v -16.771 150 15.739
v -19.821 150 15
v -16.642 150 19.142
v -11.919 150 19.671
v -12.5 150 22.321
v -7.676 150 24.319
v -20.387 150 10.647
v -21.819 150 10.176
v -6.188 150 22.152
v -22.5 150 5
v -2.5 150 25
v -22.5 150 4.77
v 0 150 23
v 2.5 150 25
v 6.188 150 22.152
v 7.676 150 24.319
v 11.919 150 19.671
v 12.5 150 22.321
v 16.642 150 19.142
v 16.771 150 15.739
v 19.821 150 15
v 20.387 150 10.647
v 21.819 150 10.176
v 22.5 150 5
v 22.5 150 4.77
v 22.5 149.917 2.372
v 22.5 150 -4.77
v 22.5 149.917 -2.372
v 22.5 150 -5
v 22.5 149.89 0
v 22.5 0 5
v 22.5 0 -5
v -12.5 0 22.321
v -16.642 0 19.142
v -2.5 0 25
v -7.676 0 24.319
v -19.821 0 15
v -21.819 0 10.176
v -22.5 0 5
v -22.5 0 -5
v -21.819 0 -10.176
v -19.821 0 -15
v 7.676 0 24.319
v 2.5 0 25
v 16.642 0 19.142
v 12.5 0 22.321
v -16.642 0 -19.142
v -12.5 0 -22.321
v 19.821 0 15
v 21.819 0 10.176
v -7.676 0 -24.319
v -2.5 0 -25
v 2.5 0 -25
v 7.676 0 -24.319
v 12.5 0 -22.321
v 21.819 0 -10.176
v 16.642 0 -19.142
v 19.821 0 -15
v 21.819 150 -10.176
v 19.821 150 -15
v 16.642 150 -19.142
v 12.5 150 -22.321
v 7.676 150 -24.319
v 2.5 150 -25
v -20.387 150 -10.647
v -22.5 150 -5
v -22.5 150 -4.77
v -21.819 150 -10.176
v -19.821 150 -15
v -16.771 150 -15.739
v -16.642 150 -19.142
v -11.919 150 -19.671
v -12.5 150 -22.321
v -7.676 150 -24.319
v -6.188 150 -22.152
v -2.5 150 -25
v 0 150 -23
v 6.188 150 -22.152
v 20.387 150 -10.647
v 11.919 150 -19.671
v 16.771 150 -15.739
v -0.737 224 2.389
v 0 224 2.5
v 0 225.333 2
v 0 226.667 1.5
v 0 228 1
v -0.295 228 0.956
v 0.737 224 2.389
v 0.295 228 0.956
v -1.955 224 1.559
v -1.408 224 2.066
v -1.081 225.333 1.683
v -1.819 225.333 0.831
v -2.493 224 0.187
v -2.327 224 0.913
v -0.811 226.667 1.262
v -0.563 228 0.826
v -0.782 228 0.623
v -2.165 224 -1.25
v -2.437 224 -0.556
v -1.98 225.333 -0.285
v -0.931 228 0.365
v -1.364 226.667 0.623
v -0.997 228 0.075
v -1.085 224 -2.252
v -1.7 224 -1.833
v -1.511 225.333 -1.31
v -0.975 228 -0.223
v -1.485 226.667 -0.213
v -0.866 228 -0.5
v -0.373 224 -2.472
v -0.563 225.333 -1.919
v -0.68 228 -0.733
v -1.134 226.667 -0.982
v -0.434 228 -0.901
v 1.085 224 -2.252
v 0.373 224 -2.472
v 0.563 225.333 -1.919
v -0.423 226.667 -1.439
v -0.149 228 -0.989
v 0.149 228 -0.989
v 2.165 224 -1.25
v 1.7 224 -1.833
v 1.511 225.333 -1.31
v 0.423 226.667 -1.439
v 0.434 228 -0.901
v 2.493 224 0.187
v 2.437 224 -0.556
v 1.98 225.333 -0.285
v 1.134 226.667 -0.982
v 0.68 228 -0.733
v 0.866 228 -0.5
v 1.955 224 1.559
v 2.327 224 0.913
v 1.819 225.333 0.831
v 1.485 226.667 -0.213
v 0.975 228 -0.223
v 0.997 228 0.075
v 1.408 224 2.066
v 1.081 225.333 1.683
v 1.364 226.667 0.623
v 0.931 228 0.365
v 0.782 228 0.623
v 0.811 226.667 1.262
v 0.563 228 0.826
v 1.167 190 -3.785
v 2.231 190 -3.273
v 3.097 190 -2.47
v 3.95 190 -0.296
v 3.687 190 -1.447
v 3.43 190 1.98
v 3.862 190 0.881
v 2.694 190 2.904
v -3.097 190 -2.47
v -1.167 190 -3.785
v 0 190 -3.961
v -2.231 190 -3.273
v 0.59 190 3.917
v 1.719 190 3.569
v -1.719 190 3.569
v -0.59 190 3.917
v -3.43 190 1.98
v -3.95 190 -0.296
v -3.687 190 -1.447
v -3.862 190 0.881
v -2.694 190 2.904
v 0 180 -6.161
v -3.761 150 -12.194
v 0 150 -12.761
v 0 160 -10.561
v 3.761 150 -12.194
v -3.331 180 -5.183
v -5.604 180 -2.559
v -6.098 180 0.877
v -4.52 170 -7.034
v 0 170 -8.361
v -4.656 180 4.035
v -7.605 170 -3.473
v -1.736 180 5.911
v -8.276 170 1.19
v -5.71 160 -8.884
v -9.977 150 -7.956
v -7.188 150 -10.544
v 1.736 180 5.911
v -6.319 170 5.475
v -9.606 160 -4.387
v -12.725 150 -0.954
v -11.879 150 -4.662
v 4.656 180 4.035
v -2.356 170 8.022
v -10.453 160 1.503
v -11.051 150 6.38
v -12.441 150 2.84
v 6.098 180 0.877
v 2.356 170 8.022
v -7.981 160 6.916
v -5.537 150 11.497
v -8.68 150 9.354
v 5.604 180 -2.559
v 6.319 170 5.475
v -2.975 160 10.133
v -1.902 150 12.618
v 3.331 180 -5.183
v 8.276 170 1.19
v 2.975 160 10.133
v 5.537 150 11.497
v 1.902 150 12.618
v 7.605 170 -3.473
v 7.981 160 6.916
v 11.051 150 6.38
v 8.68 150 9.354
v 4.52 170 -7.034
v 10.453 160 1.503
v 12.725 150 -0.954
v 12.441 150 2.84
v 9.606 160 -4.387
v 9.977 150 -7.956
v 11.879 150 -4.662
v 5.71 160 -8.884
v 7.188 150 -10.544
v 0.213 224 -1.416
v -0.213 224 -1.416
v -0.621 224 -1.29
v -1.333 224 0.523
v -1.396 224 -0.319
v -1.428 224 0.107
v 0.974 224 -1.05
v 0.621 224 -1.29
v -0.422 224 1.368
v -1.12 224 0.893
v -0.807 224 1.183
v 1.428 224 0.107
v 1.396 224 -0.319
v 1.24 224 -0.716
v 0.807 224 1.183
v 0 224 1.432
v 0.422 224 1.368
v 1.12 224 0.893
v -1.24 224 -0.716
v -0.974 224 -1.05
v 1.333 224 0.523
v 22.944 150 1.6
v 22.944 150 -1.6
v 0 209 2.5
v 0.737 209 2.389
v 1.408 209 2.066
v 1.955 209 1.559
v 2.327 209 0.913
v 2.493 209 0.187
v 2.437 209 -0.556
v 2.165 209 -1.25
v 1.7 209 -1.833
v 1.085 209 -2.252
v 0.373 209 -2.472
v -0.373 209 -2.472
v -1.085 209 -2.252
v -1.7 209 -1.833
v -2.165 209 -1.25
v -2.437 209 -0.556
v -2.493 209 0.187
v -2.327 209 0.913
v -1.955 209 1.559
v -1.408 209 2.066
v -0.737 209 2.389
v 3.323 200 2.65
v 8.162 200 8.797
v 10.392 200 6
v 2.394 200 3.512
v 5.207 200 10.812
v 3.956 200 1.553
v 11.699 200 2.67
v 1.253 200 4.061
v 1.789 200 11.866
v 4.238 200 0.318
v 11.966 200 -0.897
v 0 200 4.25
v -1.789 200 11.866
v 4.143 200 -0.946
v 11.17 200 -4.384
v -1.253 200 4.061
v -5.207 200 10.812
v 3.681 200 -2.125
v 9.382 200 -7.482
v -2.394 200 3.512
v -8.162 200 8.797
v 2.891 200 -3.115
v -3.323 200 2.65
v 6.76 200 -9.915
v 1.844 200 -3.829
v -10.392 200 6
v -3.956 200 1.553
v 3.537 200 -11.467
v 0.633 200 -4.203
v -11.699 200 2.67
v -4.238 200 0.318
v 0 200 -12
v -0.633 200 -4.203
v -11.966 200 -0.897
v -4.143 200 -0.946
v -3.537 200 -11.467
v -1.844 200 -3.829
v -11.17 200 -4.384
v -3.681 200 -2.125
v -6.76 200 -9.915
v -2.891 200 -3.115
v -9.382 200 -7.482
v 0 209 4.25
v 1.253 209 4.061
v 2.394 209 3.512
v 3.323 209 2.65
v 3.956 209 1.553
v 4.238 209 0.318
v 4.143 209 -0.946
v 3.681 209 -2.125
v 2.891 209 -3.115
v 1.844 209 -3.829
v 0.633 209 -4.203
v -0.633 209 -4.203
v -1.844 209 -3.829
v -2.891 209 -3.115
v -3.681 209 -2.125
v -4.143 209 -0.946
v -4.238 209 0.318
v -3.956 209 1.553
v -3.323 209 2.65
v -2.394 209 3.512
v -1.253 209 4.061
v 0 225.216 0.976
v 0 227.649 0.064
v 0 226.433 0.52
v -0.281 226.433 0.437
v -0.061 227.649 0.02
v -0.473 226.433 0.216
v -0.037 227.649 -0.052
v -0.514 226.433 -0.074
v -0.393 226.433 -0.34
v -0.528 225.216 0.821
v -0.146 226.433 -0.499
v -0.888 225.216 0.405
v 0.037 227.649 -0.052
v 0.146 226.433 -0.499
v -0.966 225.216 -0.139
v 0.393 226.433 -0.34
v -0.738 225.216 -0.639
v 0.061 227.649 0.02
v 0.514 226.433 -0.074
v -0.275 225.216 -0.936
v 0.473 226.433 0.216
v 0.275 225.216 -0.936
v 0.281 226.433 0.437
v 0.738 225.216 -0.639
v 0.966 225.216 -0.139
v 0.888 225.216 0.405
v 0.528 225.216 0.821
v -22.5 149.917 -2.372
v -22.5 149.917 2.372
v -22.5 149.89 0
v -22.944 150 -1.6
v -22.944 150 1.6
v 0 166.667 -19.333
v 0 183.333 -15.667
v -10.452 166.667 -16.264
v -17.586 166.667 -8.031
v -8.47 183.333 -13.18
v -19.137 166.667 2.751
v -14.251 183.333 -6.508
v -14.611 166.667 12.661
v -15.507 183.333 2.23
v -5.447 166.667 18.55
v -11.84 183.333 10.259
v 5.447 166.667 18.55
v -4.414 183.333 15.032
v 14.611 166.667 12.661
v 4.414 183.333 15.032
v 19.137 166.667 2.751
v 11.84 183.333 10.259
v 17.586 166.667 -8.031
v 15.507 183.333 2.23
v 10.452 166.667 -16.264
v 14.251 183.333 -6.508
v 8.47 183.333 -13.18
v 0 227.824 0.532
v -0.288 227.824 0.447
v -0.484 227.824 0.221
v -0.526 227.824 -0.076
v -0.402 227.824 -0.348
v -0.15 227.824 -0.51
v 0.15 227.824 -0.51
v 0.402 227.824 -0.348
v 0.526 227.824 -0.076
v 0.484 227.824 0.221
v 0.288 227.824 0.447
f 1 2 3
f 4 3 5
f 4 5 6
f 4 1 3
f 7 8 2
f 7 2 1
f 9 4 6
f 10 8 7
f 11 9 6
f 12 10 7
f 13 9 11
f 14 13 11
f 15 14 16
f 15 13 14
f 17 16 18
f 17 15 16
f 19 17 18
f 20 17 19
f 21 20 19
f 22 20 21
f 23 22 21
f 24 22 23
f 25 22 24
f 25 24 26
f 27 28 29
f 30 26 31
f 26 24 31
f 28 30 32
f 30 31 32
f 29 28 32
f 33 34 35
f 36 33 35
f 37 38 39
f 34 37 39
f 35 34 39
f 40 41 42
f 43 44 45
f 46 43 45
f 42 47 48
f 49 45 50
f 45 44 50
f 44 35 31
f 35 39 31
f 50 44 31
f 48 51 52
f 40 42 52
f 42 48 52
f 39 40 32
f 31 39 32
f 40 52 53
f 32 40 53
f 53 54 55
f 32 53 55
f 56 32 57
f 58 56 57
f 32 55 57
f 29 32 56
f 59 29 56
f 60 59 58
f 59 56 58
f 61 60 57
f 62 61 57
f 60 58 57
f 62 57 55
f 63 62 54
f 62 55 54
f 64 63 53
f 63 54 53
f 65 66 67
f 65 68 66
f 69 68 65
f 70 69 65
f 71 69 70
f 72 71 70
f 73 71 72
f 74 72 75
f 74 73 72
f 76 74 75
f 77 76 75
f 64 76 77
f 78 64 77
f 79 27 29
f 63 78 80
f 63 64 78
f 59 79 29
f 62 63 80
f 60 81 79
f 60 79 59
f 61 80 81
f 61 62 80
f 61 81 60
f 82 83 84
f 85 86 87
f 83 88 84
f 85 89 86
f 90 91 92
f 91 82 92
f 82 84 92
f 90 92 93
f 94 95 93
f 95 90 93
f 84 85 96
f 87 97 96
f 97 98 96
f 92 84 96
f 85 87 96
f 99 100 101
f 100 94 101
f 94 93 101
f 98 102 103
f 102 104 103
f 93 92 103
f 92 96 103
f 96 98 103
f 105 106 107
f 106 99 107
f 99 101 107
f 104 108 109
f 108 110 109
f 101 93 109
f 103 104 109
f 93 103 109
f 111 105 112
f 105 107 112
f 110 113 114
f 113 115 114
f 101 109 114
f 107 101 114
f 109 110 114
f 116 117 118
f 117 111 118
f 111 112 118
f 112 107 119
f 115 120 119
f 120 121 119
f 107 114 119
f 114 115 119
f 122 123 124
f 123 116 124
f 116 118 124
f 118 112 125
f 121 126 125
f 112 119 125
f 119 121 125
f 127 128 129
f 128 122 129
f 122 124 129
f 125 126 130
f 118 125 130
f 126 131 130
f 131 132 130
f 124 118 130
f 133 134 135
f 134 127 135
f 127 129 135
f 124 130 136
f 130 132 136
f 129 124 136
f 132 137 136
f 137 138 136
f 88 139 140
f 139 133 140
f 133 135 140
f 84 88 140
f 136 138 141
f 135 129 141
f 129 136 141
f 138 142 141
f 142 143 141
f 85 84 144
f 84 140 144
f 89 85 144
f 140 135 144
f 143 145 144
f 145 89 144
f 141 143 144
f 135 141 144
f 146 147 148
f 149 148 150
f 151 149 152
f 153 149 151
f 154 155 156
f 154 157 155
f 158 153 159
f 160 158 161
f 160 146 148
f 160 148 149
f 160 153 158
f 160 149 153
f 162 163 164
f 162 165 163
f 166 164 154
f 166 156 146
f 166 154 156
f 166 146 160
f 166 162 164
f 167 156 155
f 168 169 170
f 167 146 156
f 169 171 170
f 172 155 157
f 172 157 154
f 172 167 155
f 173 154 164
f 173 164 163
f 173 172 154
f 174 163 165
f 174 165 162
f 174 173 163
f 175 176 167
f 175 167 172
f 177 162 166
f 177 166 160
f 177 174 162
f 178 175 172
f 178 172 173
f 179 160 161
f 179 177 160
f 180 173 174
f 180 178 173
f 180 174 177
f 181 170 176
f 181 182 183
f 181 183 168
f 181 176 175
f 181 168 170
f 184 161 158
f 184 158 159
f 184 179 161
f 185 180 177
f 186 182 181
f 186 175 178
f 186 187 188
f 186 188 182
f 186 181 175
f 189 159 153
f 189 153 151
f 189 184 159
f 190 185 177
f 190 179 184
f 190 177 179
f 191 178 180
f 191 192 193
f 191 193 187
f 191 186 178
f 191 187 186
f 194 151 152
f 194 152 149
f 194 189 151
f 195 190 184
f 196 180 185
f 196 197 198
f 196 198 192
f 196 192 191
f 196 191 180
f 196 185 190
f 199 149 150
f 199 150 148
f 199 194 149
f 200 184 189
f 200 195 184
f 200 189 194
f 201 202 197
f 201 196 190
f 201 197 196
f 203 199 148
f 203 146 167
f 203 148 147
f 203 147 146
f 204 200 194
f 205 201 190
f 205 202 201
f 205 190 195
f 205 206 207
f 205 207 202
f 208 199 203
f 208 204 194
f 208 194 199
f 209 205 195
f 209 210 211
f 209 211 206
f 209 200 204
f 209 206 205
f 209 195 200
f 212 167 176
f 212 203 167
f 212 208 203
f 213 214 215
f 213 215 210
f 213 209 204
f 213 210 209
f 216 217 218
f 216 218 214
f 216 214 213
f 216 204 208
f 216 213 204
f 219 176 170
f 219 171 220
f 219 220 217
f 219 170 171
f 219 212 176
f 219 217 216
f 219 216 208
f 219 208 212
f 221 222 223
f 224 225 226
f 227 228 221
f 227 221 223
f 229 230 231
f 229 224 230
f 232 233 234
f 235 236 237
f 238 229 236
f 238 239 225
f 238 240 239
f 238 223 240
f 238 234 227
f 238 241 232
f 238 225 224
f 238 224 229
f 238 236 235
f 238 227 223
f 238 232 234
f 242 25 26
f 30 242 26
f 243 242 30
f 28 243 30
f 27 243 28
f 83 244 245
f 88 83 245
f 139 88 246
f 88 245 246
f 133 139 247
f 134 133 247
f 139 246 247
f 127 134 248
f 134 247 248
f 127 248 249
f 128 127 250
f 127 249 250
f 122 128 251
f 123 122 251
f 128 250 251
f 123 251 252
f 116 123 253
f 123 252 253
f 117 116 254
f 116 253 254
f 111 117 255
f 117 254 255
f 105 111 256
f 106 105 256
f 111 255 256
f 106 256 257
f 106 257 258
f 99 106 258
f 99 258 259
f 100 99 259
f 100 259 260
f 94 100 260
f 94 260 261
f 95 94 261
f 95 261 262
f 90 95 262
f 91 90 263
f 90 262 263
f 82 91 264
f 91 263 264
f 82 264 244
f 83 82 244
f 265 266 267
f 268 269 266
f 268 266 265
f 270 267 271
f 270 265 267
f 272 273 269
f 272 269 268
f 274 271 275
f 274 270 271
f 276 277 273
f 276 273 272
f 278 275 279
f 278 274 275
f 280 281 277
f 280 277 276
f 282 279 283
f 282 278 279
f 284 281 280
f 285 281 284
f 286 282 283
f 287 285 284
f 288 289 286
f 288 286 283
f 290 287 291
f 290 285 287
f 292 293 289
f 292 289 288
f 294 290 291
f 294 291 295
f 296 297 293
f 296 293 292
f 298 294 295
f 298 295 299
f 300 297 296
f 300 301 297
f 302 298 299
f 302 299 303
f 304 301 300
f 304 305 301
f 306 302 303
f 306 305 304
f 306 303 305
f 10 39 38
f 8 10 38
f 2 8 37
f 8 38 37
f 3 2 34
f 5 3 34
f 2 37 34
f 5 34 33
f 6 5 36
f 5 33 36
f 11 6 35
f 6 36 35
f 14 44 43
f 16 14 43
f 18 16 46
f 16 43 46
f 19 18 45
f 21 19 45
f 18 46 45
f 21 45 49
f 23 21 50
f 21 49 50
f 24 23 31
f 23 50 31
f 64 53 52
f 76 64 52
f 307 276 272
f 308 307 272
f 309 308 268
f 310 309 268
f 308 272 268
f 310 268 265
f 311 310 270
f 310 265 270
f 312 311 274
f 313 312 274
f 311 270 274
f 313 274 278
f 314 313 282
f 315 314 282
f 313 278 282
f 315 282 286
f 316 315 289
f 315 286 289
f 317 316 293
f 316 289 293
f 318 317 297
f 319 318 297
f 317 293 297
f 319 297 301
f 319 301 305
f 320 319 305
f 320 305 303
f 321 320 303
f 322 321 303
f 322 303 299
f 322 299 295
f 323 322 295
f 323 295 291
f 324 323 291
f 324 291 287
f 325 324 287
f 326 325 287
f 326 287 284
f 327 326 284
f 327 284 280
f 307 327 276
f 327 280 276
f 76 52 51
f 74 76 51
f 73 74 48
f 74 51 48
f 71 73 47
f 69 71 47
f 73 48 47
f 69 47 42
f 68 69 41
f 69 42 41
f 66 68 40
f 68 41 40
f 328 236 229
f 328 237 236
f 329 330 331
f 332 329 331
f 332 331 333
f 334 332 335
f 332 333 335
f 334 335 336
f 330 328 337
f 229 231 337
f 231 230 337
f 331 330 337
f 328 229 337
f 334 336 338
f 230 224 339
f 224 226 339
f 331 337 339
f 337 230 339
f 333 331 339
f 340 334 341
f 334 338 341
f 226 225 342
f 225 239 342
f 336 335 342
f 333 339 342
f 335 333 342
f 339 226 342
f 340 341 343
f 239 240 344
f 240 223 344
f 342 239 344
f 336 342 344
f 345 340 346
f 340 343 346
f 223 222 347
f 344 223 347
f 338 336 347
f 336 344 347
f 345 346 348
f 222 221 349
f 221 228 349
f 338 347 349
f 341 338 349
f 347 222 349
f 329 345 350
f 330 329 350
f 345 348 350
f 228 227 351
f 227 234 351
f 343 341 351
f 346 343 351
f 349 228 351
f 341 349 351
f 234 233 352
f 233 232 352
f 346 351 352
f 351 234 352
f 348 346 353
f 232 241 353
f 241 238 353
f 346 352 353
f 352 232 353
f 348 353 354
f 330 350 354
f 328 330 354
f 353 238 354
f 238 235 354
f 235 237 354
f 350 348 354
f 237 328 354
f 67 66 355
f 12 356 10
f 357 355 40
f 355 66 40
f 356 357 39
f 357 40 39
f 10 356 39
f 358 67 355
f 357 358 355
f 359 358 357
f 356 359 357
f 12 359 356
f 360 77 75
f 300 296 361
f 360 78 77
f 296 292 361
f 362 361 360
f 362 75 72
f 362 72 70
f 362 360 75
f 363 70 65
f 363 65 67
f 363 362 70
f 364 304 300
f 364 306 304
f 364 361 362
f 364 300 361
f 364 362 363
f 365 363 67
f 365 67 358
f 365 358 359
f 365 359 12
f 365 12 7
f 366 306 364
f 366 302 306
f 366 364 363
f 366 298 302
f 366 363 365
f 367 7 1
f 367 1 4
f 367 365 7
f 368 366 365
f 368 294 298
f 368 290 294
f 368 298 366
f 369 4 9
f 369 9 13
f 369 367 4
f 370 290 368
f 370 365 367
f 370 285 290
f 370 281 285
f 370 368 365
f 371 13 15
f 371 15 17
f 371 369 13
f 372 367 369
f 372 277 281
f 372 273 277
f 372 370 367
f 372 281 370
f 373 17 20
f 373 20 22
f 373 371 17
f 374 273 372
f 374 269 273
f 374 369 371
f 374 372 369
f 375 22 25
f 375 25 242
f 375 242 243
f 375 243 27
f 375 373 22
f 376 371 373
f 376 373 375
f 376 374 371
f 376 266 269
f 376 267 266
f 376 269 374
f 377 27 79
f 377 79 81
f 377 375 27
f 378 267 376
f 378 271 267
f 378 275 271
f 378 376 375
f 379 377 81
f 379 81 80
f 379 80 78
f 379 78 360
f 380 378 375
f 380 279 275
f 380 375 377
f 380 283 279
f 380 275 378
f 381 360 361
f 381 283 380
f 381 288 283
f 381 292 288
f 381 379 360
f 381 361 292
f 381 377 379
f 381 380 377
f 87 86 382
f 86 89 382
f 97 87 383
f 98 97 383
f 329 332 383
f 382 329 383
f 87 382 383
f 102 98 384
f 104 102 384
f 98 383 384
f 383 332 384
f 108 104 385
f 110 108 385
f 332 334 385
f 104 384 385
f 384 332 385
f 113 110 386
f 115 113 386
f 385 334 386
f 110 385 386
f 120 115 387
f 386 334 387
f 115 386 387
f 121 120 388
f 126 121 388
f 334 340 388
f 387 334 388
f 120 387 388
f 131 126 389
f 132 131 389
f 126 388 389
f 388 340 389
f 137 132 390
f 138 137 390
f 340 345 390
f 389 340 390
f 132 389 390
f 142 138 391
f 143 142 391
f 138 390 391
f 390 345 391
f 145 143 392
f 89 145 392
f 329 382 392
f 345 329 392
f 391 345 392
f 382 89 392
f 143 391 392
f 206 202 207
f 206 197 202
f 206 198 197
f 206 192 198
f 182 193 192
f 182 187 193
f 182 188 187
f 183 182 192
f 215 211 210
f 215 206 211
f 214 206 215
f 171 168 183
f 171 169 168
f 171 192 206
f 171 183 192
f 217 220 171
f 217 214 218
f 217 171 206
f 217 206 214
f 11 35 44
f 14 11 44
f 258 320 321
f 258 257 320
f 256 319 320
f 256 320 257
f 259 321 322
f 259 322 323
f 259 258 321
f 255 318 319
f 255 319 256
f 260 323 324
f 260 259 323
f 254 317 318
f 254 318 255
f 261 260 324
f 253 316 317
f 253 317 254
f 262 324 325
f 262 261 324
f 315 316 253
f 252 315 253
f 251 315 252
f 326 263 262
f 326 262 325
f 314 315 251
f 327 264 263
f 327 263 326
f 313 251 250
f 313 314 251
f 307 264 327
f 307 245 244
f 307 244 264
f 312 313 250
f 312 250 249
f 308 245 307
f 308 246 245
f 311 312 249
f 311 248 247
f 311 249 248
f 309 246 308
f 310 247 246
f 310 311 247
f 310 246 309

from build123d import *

# Parameters (mm, degrees)
SALIENTE_EXTRUIR1_DEPTH = 150
CROQUIS5_R              = 4.25
SALIENTE_EXTRUIR3_DEPTH = 9
CROQUIS6_R              = 2.5
SALIENTE_EXTRUIR4_DEPTH = 15


with BuildPart() as part:
    # Croquis1 → Saliente-Extruir1 (new body)
    with BuildSketch(Plane(origin=(0, 0, 0), x_dir=(1, 0, 0), z_dir=(0, 1, 0))):
        with BuildLine():
            Line((-2.5, -25), (2.5, -25))
            ThreePointArc((2.5, -25), (16.642135624, -19.142135624), (22.5, -5))
            Line((22.5, -5), (22.5, 5))
            ThreePointArc((22.5, 5), (16.642135624, 19.142135624), (2.5, 25))
            Line((2.5, 25), (-2.5, 25))
            ThreePointArc((-2.5, 25), (-16.642135624, 19.142135624), (-22.5, 5))
            Line((-22.5, 5), (-22.5, -5))
            ThreePointArc((-22.5, -5), (-16.642135624, -19.142135624), (-2.5, -25))
        make_face()
    extrude(amount=SALIENTE_EXTRUIR1_DEPTH)

    # Croquis4 → Revolución-Lámina1 (revolve)
    with BuildSketch(Plane(origin=(0, 0, 0), x_dir=(0, 0, -1), z_dir=(1, 0, 0)), mode=Mode.PRIVATE) as revoluci_n_l_mina1_sk:
        Polygon((-23, 150), (-12, 200), (0, 200), (0, 190), (-3.960859411, 190), (-13.233555333, 147.851382173), align=None)
    revolve(revoluci_n_l_mina1_sk.sketch.rotate(Axis((0, 150, 0), (0, 1, 0)), 180), axis=Axis((0, 150, 0), (0, 1, 0)))

    # Croquis5 → Saliente-Extruir3 (add)
    with BuildSketch(Plane(origin=(0, 200, 0), x_dir=(1, 0, 0), z_dir=(0, 1, 0))):
        with Locations(Location((0, 0, 0), (0, 0, 270))):
            Circle(CROQUIS5_R)
    extrude(amount=SALIENTE_EXTRUIR3_DEPTH)

    # Croquis6 → Saliente-Extruir4 (add)
    with BuildSketch(Plane(origin=(0, 209, 0), x_dir=(1, 0, 0), z_dir=(0, 1, 0))):
        with Locations(Location((0, 0, 0), (0, 0, 270))):
            Circle(CROQUIS6_R)
    extrude(amount=SALIENTE_EXTRUIR4_DEPTH)

    # Croquis7 → Revolución-Lámina4 (revolve)
    with BuildSketch(Plane(origin=(0, 0, 0), x_dir=(0, 0, -1), z_dir=(1, 0, 0))):
        Polygon((-2.5, 224), (-1, 228), (-0.063670822, 227.648876558), (-1.563670822, 223.648876558), align=None)
    revolve(axis=Axis((0, 228, 0), (0, -1, 0)))


solid = part.part
